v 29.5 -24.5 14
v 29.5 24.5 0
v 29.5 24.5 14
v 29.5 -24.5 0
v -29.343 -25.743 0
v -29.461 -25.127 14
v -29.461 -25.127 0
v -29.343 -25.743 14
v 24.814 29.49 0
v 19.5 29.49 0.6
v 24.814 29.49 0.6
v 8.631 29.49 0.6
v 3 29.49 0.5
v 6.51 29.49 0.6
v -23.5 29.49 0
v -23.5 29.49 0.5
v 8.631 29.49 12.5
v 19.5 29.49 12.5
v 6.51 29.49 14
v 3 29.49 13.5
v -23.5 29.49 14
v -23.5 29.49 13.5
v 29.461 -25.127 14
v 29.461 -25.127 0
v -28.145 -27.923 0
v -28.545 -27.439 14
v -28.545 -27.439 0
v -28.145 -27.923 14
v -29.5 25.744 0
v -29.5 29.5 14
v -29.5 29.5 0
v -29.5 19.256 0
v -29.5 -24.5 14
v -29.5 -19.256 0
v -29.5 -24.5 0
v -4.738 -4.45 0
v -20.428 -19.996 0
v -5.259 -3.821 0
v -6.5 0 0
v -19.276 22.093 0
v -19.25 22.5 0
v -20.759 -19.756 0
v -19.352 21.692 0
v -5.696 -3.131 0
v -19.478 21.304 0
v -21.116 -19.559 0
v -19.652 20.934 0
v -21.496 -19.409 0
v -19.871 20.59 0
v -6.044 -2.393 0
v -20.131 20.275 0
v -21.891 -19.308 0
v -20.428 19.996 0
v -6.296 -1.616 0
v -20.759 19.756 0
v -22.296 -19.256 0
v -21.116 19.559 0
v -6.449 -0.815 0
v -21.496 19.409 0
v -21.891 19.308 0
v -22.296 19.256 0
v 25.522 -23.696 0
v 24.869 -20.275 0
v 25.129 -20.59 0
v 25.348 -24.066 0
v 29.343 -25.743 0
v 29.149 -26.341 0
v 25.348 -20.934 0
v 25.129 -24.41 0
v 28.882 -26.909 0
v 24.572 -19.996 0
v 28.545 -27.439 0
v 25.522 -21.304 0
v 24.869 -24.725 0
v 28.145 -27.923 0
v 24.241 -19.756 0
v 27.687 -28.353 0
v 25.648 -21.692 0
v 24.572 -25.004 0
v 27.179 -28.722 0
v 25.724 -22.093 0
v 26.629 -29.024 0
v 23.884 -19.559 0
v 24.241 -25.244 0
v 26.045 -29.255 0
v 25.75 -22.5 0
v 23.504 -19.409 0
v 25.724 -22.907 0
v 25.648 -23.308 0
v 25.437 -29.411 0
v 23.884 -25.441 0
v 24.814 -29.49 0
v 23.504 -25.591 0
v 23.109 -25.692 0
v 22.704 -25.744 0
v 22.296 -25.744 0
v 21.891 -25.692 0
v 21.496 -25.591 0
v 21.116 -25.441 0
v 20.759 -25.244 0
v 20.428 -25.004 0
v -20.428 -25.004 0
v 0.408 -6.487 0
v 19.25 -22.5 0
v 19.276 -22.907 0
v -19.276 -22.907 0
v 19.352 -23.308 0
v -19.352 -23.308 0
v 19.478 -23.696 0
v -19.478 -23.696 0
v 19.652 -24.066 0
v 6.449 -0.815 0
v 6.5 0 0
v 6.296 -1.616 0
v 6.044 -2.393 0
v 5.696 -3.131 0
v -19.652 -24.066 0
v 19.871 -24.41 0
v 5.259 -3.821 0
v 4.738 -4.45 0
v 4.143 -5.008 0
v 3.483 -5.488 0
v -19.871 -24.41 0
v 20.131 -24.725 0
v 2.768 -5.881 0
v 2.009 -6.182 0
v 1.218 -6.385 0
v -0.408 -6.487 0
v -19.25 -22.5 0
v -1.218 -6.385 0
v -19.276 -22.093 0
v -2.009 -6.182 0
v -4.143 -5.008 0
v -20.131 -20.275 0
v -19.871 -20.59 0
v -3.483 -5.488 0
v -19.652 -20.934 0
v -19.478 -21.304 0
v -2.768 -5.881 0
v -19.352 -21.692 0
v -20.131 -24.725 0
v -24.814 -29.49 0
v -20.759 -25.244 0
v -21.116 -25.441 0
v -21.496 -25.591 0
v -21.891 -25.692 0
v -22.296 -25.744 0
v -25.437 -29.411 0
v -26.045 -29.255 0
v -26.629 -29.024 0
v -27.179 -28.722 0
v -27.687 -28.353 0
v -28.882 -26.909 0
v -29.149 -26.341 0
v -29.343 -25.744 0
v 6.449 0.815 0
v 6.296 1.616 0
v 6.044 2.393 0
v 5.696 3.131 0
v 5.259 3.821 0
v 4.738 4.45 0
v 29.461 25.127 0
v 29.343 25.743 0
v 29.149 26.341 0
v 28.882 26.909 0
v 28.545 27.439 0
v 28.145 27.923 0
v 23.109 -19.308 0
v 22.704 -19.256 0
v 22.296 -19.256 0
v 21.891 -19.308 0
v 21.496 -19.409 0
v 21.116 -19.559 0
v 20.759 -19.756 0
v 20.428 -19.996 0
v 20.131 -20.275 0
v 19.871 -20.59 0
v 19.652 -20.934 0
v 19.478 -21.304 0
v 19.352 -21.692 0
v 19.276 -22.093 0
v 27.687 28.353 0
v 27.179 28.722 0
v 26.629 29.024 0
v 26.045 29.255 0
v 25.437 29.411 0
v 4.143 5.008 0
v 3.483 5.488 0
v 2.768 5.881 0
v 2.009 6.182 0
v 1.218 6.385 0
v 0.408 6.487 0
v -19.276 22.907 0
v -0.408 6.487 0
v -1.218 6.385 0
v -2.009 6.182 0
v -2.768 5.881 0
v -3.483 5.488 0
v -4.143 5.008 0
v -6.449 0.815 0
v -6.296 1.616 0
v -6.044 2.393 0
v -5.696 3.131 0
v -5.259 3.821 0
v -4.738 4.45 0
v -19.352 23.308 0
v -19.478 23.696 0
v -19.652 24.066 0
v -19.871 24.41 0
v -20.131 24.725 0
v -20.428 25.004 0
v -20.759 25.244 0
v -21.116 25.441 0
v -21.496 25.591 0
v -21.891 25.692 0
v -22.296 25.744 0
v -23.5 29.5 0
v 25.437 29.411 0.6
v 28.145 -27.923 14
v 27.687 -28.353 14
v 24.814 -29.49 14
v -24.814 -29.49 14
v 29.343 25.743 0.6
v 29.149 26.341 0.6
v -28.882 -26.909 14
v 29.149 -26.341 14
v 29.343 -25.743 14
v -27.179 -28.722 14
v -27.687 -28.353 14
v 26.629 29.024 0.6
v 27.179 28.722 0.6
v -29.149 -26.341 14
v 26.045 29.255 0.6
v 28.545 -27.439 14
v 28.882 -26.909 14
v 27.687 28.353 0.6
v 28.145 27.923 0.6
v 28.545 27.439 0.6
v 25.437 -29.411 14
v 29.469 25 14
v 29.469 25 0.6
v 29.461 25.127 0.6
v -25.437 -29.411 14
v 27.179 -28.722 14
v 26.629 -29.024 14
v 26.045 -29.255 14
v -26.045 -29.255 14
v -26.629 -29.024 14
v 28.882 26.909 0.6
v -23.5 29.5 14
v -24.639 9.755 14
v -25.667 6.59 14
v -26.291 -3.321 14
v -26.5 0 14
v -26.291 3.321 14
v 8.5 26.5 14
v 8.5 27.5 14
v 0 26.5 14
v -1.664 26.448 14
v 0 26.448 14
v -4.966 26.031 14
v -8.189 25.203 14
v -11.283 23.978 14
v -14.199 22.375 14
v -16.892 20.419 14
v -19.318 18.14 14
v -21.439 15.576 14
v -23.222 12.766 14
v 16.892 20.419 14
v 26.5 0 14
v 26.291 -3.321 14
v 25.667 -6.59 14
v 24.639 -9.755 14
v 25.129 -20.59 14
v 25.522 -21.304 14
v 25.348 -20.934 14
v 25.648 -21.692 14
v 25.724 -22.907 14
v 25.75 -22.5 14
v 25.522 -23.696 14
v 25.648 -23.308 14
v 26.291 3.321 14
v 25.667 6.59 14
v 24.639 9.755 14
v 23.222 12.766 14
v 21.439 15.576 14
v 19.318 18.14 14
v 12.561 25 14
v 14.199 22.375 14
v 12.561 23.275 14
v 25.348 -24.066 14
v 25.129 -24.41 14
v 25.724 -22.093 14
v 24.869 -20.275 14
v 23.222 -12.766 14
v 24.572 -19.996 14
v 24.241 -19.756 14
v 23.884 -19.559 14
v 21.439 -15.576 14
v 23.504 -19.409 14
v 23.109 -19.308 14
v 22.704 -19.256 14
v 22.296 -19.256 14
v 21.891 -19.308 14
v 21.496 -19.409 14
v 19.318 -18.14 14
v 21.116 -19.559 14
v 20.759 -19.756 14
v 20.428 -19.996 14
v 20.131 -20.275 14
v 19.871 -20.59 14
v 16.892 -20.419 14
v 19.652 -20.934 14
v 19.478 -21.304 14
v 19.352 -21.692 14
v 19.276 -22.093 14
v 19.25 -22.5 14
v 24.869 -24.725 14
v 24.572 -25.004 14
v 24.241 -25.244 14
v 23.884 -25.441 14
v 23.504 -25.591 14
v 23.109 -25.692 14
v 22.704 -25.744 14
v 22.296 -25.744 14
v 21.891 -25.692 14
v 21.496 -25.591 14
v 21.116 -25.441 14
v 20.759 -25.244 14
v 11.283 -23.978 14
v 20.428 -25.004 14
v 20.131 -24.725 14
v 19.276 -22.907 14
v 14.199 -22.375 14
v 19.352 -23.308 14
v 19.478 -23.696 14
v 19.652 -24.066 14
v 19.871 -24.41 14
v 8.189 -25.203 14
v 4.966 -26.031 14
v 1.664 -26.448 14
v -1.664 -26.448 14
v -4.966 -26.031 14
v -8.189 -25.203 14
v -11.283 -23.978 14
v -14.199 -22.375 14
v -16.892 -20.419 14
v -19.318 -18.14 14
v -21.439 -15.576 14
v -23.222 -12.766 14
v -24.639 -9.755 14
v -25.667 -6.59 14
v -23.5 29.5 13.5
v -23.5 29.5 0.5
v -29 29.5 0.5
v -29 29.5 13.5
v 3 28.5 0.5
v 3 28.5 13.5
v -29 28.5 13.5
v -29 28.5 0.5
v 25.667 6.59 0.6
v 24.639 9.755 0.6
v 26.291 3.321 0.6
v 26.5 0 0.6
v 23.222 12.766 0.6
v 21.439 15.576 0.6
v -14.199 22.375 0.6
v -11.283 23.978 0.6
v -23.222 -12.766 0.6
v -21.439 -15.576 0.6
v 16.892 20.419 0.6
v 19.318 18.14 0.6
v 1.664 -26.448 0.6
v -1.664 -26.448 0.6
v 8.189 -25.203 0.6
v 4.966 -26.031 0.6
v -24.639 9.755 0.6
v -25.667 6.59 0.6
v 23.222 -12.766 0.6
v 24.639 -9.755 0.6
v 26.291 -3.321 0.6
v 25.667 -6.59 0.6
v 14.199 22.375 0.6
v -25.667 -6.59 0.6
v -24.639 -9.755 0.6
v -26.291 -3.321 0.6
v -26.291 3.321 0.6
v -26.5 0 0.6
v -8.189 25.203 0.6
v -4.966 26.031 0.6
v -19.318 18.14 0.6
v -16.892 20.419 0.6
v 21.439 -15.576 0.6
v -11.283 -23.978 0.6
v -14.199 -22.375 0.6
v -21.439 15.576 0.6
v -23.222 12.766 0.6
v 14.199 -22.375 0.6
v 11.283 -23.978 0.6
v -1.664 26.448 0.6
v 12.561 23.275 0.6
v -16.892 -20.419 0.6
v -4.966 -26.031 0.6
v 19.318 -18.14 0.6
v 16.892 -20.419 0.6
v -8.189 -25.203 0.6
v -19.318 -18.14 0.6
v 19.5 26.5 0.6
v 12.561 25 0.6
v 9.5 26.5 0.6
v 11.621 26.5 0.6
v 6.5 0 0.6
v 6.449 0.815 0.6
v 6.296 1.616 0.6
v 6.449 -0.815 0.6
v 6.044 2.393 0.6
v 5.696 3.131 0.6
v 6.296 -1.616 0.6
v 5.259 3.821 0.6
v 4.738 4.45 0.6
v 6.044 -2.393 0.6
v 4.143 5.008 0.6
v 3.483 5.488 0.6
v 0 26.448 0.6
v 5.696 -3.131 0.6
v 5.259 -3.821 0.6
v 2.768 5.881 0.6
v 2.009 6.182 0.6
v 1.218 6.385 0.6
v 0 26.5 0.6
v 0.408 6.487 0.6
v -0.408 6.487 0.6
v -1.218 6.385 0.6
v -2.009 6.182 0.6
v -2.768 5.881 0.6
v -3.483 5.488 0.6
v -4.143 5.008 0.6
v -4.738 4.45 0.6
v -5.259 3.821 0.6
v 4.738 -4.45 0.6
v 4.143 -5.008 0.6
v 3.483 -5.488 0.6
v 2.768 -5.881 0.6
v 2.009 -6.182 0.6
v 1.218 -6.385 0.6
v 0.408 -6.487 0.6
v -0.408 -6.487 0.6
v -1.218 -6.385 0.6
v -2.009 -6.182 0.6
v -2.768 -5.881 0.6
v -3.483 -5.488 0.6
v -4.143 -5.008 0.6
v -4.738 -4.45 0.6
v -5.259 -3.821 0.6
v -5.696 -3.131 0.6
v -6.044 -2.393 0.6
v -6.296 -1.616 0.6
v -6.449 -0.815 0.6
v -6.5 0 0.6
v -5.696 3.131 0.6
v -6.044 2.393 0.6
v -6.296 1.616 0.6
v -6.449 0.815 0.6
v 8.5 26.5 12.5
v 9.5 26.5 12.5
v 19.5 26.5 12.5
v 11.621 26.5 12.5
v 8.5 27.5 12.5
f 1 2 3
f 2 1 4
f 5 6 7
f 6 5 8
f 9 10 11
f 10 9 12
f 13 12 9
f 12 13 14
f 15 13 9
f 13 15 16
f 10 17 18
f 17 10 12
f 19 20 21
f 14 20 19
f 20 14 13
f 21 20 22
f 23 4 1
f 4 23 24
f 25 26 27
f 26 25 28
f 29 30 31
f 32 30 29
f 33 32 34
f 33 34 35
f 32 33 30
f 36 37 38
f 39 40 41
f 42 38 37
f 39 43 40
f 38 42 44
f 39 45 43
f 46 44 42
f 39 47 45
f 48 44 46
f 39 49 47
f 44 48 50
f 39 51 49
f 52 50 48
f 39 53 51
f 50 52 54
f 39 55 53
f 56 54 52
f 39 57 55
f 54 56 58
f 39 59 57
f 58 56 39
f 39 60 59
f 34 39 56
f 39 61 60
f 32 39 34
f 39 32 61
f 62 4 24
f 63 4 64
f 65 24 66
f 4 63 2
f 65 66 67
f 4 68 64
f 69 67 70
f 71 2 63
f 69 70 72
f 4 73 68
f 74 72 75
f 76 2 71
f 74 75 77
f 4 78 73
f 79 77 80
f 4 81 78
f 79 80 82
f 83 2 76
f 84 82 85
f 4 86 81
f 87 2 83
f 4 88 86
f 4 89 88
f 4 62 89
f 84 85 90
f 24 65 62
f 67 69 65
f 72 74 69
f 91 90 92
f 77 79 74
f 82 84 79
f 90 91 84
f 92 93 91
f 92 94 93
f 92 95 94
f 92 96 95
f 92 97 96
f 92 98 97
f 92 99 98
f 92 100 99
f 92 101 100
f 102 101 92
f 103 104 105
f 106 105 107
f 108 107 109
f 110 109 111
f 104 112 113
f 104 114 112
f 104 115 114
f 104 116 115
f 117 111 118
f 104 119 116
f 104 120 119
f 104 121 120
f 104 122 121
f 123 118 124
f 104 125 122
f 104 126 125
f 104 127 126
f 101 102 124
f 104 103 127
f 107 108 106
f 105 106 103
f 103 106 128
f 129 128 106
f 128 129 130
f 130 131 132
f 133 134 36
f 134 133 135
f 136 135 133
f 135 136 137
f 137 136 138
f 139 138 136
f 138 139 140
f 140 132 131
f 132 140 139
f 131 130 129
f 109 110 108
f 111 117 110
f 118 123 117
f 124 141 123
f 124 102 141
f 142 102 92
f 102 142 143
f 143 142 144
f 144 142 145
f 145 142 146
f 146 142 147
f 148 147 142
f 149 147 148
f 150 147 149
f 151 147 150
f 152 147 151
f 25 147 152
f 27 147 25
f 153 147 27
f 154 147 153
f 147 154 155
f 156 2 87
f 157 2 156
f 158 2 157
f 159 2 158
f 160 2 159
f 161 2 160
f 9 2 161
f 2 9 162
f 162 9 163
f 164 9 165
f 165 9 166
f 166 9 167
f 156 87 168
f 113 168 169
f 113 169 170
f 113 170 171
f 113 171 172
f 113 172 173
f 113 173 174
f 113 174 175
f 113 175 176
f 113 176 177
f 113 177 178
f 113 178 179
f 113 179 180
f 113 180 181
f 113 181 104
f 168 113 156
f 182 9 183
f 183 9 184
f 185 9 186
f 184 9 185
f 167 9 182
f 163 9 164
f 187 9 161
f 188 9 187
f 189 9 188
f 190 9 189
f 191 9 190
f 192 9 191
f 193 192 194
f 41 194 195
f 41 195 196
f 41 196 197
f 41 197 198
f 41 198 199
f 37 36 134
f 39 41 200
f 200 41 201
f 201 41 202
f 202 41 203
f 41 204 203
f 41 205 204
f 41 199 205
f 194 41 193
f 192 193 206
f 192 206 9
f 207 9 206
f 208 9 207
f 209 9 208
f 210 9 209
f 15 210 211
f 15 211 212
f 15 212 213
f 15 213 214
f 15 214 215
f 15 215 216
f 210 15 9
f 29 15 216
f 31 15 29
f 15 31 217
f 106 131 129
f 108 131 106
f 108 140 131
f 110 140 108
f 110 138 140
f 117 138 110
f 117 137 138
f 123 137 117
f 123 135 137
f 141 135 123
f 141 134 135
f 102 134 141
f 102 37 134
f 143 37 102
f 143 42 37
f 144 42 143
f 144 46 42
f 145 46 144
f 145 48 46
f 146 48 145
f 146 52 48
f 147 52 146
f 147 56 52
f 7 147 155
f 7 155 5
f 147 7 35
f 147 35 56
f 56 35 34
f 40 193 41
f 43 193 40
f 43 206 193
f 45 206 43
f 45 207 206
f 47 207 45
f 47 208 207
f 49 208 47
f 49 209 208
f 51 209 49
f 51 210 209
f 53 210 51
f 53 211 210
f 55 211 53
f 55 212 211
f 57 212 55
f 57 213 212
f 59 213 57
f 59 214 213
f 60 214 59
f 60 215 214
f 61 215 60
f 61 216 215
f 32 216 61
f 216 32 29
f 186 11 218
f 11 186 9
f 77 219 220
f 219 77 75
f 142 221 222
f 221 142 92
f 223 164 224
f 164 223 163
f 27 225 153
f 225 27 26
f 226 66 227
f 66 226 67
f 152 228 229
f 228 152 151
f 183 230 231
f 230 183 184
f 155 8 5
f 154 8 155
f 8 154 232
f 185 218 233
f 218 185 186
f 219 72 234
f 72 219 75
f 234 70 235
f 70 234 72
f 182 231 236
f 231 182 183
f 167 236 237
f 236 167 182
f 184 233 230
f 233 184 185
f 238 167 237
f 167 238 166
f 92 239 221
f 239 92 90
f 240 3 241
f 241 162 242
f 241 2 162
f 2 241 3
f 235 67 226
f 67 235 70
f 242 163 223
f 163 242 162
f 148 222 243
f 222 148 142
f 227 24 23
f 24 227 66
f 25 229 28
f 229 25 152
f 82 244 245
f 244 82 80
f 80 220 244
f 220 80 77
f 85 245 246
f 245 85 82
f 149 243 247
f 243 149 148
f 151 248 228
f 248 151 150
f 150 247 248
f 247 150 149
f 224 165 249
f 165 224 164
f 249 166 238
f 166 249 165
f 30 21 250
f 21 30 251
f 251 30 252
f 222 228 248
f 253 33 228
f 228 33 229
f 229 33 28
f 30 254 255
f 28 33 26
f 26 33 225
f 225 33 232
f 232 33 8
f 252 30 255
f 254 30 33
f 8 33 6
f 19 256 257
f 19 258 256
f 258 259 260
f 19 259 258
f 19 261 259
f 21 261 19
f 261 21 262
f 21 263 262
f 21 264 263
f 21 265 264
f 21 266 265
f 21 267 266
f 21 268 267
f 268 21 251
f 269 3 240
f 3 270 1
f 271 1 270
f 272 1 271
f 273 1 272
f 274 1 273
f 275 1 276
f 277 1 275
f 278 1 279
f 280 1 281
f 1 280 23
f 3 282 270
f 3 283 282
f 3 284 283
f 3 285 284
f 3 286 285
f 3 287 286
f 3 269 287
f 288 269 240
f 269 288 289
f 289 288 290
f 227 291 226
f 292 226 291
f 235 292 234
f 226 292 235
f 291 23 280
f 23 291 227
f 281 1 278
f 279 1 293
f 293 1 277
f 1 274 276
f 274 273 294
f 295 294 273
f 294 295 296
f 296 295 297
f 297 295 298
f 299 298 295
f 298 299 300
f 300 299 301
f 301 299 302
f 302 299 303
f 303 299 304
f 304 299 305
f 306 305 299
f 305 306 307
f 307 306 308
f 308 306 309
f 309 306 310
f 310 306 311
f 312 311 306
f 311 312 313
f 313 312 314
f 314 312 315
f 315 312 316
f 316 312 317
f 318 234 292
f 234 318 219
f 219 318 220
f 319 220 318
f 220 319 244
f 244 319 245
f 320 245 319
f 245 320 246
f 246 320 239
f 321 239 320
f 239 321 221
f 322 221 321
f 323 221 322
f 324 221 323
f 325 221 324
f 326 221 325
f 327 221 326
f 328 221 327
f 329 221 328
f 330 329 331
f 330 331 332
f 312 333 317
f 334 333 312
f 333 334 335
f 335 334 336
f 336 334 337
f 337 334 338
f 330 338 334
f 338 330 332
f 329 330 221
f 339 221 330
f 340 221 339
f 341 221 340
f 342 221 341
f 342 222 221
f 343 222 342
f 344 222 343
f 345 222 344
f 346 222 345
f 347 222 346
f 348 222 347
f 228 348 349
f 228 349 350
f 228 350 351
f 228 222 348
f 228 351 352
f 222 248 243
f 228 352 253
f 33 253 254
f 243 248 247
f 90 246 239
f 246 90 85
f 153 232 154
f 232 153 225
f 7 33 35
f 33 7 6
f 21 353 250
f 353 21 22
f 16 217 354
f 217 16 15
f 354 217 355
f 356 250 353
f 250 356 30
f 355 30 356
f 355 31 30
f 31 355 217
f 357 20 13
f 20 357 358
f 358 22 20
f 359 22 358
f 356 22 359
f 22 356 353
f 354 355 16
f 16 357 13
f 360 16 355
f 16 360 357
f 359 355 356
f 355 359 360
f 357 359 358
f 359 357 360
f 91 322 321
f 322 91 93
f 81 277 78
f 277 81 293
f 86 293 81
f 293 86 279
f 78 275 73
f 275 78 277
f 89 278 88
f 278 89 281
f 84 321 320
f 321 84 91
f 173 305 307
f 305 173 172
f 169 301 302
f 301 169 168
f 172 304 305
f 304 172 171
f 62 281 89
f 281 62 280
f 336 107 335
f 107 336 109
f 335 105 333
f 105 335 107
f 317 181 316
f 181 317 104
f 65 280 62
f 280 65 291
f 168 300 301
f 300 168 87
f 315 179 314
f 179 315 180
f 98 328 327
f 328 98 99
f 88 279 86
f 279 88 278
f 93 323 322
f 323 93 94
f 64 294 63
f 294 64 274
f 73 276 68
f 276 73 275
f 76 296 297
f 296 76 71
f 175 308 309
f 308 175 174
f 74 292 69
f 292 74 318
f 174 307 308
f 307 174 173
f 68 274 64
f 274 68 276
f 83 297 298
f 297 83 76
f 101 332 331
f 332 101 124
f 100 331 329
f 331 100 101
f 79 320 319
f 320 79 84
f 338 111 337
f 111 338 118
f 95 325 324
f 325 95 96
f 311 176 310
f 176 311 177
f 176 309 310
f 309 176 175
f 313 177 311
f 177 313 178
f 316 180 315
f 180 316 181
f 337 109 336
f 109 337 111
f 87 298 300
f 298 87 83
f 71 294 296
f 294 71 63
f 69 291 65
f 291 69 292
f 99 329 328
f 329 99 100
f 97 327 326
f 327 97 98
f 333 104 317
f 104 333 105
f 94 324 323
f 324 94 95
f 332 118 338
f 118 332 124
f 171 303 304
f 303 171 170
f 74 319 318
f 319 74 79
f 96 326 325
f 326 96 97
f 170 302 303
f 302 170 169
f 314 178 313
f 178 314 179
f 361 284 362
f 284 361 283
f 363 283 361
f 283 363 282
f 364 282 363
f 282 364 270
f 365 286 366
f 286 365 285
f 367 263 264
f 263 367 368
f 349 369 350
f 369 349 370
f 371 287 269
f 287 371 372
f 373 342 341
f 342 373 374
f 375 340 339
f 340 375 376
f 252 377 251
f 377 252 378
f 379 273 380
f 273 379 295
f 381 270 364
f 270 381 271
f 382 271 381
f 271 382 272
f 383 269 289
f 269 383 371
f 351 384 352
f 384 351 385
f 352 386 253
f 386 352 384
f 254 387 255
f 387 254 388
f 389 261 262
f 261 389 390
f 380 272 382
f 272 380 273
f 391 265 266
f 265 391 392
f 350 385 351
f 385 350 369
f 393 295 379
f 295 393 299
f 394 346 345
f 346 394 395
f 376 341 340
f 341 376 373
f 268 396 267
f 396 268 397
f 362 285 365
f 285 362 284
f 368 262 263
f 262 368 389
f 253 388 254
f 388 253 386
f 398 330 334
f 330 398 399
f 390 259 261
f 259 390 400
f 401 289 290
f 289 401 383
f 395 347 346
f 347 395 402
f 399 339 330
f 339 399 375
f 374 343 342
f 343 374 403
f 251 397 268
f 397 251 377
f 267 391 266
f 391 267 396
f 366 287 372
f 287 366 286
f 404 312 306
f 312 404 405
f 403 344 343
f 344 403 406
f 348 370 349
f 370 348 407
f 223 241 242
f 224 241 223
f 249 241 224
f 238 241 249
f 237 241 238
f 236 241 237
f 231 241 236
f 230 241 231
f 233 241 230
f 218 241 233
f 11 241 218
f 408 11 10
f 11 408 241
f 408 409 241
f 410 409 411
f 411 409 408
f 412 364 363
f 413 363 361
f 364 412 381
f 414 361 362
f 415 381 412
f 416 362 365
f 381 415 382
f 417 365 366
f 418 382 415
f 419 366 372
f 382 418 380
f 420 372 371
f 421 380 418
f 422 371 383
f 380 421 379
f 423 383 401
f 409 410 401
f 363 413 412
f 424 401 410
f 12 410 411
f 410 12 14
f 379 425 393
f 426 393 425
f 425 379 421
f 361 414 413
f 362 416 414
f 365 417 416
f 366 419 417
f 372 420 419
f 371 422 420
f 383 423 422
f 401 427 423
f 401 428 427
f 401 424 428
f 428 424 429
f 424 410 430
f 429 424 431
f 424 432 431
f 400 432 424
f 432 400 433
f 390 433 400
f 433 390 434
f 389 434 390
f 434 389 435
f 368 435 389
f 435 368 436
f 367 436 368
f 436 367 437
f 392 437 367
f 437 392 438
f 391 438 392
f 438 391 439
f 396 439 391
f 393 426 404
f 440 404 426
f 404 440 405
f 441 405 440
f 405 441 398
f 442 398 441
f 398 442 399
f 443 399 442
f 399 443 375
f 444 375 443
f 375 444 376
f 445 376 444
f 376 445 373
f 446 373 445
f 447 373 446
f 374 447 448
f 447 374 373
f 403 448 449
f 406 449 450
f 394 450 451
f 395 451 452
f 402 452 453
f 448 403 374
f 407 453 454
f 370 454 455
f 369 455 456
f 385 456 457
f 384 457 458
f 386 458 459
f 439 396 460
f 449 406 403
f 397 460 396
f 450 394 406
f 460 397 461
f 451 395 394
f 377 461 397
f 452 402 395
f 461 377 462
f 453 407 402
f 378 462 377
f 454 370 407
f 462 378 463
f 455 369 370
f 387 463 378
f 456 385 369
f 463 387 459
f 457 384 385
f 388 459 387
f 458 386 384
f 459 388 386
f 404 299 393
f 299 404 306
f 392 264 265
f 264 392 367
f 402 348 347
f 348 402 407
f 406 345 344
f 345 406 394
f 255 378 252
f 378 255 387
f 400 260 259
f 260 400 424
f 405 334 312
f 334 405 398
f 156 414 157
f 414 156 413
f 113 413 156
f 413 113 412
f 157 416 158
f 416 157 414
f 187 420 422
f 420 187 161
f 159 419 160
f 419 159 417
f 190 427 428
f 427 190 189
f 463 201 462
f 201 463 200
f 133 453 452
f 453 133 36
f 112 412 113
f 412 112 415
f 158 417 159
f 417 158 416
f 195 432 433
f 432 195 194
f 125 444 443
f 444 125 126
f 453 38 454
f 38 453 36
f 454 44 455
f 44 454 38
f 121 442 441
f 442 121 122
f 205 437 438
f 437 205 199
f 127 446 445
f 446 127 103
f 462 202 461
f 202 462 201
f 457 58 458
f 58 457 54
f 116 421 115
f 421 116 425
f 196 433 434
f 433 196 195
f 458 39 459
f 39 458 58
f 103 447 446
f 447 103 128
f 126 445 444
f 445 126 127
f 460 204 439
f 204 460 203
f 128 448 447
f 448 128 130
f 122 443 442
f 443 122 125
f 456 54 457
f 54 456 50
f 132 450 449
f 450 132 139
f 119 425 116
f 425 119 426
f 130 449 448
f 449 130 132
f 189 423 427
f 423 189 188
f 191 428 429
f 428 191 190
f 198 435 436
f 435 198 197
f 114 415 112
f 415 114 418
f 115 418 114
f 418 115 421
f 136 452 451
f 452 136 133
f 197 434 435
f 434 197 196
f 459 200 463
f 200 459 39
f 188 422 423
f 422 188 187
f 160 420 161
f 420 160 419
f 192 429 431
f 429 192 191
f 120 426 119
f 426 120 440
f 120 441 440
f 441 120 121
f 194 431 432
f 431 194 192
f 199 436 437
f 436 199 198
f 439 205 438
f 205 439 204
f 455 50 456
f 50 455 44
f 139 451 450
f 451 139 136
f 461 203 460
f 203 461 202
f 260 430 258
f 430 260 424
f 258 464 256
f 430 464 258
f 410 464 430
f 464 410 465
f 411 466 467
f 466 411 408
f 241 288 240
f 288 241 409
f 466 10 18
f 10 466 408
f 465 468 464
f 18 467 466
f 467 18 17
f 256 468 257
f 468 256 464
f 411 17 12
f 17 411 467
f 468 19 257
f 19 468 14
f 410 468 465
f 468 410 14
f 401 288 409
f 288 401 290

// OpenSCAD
$fn = 50;


difference() {
	union() {
		hull() {
			translate(v = [-24.5000000000, 24.5000000000, 0]) {
				cylinder(h = 14, r = 5);
			}
			translate(v = [24.5000000000, 24.5000000000, 0]) {
				cylinder(h = 14, r = 5);
			}
			translate(v = [-24.5000000000, -24.5000000000, 0]) {
				cylinder(h = 14, r = 5);
			}
			translate(v = [24.5000000000, -24.5000000000, 0]) {
				cylinder(h = 14, r = 5);
			}
		}
		translate(v = [-29.5000000000, 23.5000000000, 0]) {
			cube(size = [6, 6, 14]);
		}
	}
	union() {
		translate(v = [-30.0000000000, -22.5000000000, -250.0000000000]) {
			rotate(a = [0, 0, 0]) {
				difference() {
					union() {
						hull() {
							translate(v = [7.5000000000, 0, 0]) {
								cylinder(h = 250, r = 3.2500000000, r1 = 3.2500000000, r2 = 3.2500000000);
							}
							translate(v = [-7.5000000000, 0, 0]) {
								cylinder(h = 250, r = 3.2500000000, r1 = 3.2500000000, r2 = 3.2500000000);
							}
						}
					}
					union();
				}
			}
		}
		translate(v = [-30.0000000000, 22.5000000000, -250.0000000000]) {
			rotate(a = [0, 0, 0]) {
				difference() {
					union() {
						hull() {
							translate(v = [7.5000000000, 0, 0]) {
								cylinder(h = 250, r = 3.2500000000, r1 = 3.2500000000, r2 = 3.2500000000);
							}
							translate(v = [-7.5000000000, 0, 0]) {
								cylinder(h = 250, r = 3.2500000000, r1 = 3.2500000000, r2 = 3.2500000000);
							}
						}
					}
					union();
				}
			}
		}
		translate(v = [-29.0000000000, 28.5000000000, 0.5000000000]) {
			cube(size = [32, 1, 13.0000000000]);
		}
		translate(v = [22.5000000000, -22.5000000000, -50.0000000000]) {
			cylinder(h = 100, r = 3.2500000000);
		}
		translate(v = [0, 0, 0.6000000000]) {
			cylinder(h = 16.4000000000, r = 26.5000000000);
		}
		translate(v = [0, 0, -7.0000000000]) {
			cylinder(h = 14, r = 6.5000000000);
		}
		translate(v = [0.0000000000, 25.0000000000, 0.6000000000]) {
			cube(size = [29.5000000000, 1.5000000000, 16.4000000000]);
		}
		translate(v = [19.5000000000, 25.0000000000, 0.6000000000]) {
			cube(size = [10, 4.5000000000, 16.4000000000]);
		}
		translate(v = [8.5000000000, 25.0000000000, 12.5000000000]) {
			cube(size = [21, 4.5000000000, 1.5000000000]);
		}
		translate(v = [5.7500000000, 30.2500000000, 0.6000000000]) {
			rotate(a = [0, 0, -45]) {
				cube(size = [7.5000000000, 1.5000000000, 16.4000000000]);
			}
		}
		translate(v = [5.0610000000, 23.0000000000, 0.6000000000]) {
			cube(size = [7.5000000000, 2, 13.4000000000]);
		}
	}
}
